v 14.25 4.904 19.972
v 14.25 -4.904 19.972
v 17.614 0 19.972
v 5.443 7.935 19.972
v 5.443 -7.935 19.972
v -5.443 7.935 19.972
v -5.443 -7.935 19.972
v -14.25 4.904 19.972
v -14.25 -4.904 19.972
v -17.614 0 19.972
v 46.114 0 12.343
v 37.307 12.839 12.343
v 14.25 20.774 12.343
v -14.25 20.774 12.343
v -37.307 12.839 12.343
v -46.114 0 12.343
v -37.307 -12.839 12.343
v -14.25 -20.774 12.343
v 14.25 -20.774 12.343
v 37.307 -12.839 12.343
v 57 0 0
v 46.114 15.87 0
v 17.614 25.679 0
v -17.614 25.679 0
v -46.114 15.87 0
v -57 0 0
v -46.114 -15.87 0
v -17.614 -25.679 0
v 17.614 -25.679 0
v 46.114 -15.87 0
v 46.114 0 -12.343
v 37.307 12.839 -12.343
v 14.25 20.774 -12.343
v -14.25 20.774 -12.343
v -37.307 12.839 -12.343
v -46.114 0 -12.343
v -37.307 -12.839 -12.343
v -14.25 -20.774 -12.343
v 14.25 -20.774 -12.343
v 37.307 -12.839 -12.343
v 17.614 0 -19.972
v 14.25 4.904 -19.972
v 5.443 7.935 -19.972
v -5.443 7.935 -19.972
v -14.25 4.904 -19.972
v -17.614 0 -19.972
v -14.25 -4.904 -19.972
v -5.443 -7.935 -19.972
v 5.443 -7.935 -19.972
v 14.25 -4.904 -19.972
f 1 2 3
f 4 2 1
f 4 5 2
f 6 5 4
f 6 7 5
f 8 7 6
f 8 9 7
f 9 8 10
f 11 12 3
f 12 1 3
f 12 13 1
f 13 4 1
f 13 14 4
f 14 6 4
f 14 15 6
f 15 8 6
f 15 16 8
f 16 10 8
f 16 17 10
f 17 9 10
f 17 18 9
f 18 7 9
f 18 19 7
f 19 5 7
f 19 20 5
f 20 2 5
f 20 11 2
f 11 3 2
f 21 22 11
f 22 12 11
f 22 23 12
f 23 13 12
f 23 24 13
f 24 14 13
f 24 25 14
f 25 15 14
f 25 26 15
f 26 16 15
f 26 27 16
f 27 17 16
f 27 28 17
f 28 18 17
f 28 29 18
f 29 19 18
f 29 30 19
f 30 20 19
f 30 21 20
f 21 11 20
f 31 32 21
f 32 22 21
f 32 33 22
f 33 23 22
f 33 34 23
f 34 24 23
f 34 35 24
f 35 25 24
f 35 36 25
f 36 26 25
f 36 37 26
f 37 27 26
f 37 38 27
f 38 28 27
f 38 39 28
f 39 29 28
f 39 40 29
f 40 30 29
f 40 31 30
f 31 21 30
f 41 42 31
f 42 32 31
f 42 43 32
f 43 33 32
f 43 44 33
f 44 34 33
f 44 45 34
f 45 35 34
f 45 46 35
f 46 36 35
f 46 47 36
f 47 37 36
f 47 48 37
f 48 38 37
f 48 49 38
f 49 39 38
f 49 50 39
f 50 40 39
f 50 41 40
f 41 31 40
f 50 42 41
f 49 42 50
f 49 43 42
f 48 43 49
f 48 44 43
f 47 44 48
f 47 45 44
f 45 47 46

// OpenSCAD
// Generated by SolidPython 1.0.1 on 2020-07-29 00:46:53


scale(v = [19, 9, 7]) {
	sphere(r = 3);
}
/***********************************************
*********      SolidPython code:      **********
************************************************
 
# import packages: SolidPython
from solid import *
from solid.utils import *
from itertools import chain, combinations, permutations


class Resize:

    def __init__(self, scad_file):
        self.scad_file = scad_file
        #self.scad_file = import_scad(scad_file)
        # cone/cylinder param:
        self.r1 = 0
        self.r2 = 0
        self.h = 0
        # rectangular prism param:
        self.w = 0
        self.l = 0
        # ellipse param:
        self.r = 0

    # import OpenScad code (file name corresponds to shape)


    # classify shape + parameters
    def assign(self, param1, param2, param3):
        if self.scad_file == 'cone.scad':
            self.r1 = param1
            self.r2 = param2
            self.h = param3
        elif self.scad_file == 'cylinder.scad':
            self.r1 = param1
            self.r2 = param2
            self.h = param3
        elif self.scad_file == 'rectangularPrism.scad':
            self.h = param1
            self.l = param2
            self.w = param3
        else:
            self.r = param1
            self.h = param2

    # resize parameters
    def iterate(self):
        x = range(3, 20, 2)
        i = 1
        if self.scad_file == 'cone.scad':
            tempList = list(permutations(x, 2))
            for temp in tempList:
                param1 = temp[0]
                param2 = temp[1]
                filepath = 'produced_scad_files/' + 'cone' + str(param1) + '_' + str(param2) + '_' + '.scad'
                scad_render_to_file(cylinder(h=param1, r1=param2, r2=0), filepath)

        elif self.scad_file == 'cylinder.scad':
            tempList = list(permutations(x, 3))
            for temp in tempList:
                param1 = temp[0]
                param2 = temp[1]
                filepath = 'produced_scad_files/' + 'cylinder' + str(param1) + '_' + str(param2) + '_' + '.scad'
                scad_render_to_file(cylinder(h=param1, r1=param2, r2=param2), filepath)

        elif self.scad_file == 'rectangularPrism.scad':
            tempList = list(permutations(x, 3))
            for temp in tempList:
                param1 = temp[0]
                param2 = temp[1]
                param3 = temp[2]
                filepath = 'produced_scad_files/' + 'rectangularPrism' + str(param1) + '_' + str(param2) + '_' + str(
                    param3) + '.scad'
                scad_render_to_file(cube(size=(param1, param2, param3)), filepath)

        elif self.scad_file == 'ellipse.scad':
            tempList = list(permutations(x, 4))
            for temp in tempList:
                param1 = temp[0]
                param2 = temp[1]
                param3 = temp[2]
                param4 = temp[3]
                filepath = 'produced_scad_files/' + 'ellipse' + str(param1) + '_' + str(param2) + '_' + str(param3) + '_' + str(param4) + '.scad'
                scad_render_to_file(scale([param1, param2, param3])(sphere(r=param4)), filepath)

    def render_to_scadfile(self):
        scad_render_to_file(scad, 'example.scad') 
 
************************************************/
